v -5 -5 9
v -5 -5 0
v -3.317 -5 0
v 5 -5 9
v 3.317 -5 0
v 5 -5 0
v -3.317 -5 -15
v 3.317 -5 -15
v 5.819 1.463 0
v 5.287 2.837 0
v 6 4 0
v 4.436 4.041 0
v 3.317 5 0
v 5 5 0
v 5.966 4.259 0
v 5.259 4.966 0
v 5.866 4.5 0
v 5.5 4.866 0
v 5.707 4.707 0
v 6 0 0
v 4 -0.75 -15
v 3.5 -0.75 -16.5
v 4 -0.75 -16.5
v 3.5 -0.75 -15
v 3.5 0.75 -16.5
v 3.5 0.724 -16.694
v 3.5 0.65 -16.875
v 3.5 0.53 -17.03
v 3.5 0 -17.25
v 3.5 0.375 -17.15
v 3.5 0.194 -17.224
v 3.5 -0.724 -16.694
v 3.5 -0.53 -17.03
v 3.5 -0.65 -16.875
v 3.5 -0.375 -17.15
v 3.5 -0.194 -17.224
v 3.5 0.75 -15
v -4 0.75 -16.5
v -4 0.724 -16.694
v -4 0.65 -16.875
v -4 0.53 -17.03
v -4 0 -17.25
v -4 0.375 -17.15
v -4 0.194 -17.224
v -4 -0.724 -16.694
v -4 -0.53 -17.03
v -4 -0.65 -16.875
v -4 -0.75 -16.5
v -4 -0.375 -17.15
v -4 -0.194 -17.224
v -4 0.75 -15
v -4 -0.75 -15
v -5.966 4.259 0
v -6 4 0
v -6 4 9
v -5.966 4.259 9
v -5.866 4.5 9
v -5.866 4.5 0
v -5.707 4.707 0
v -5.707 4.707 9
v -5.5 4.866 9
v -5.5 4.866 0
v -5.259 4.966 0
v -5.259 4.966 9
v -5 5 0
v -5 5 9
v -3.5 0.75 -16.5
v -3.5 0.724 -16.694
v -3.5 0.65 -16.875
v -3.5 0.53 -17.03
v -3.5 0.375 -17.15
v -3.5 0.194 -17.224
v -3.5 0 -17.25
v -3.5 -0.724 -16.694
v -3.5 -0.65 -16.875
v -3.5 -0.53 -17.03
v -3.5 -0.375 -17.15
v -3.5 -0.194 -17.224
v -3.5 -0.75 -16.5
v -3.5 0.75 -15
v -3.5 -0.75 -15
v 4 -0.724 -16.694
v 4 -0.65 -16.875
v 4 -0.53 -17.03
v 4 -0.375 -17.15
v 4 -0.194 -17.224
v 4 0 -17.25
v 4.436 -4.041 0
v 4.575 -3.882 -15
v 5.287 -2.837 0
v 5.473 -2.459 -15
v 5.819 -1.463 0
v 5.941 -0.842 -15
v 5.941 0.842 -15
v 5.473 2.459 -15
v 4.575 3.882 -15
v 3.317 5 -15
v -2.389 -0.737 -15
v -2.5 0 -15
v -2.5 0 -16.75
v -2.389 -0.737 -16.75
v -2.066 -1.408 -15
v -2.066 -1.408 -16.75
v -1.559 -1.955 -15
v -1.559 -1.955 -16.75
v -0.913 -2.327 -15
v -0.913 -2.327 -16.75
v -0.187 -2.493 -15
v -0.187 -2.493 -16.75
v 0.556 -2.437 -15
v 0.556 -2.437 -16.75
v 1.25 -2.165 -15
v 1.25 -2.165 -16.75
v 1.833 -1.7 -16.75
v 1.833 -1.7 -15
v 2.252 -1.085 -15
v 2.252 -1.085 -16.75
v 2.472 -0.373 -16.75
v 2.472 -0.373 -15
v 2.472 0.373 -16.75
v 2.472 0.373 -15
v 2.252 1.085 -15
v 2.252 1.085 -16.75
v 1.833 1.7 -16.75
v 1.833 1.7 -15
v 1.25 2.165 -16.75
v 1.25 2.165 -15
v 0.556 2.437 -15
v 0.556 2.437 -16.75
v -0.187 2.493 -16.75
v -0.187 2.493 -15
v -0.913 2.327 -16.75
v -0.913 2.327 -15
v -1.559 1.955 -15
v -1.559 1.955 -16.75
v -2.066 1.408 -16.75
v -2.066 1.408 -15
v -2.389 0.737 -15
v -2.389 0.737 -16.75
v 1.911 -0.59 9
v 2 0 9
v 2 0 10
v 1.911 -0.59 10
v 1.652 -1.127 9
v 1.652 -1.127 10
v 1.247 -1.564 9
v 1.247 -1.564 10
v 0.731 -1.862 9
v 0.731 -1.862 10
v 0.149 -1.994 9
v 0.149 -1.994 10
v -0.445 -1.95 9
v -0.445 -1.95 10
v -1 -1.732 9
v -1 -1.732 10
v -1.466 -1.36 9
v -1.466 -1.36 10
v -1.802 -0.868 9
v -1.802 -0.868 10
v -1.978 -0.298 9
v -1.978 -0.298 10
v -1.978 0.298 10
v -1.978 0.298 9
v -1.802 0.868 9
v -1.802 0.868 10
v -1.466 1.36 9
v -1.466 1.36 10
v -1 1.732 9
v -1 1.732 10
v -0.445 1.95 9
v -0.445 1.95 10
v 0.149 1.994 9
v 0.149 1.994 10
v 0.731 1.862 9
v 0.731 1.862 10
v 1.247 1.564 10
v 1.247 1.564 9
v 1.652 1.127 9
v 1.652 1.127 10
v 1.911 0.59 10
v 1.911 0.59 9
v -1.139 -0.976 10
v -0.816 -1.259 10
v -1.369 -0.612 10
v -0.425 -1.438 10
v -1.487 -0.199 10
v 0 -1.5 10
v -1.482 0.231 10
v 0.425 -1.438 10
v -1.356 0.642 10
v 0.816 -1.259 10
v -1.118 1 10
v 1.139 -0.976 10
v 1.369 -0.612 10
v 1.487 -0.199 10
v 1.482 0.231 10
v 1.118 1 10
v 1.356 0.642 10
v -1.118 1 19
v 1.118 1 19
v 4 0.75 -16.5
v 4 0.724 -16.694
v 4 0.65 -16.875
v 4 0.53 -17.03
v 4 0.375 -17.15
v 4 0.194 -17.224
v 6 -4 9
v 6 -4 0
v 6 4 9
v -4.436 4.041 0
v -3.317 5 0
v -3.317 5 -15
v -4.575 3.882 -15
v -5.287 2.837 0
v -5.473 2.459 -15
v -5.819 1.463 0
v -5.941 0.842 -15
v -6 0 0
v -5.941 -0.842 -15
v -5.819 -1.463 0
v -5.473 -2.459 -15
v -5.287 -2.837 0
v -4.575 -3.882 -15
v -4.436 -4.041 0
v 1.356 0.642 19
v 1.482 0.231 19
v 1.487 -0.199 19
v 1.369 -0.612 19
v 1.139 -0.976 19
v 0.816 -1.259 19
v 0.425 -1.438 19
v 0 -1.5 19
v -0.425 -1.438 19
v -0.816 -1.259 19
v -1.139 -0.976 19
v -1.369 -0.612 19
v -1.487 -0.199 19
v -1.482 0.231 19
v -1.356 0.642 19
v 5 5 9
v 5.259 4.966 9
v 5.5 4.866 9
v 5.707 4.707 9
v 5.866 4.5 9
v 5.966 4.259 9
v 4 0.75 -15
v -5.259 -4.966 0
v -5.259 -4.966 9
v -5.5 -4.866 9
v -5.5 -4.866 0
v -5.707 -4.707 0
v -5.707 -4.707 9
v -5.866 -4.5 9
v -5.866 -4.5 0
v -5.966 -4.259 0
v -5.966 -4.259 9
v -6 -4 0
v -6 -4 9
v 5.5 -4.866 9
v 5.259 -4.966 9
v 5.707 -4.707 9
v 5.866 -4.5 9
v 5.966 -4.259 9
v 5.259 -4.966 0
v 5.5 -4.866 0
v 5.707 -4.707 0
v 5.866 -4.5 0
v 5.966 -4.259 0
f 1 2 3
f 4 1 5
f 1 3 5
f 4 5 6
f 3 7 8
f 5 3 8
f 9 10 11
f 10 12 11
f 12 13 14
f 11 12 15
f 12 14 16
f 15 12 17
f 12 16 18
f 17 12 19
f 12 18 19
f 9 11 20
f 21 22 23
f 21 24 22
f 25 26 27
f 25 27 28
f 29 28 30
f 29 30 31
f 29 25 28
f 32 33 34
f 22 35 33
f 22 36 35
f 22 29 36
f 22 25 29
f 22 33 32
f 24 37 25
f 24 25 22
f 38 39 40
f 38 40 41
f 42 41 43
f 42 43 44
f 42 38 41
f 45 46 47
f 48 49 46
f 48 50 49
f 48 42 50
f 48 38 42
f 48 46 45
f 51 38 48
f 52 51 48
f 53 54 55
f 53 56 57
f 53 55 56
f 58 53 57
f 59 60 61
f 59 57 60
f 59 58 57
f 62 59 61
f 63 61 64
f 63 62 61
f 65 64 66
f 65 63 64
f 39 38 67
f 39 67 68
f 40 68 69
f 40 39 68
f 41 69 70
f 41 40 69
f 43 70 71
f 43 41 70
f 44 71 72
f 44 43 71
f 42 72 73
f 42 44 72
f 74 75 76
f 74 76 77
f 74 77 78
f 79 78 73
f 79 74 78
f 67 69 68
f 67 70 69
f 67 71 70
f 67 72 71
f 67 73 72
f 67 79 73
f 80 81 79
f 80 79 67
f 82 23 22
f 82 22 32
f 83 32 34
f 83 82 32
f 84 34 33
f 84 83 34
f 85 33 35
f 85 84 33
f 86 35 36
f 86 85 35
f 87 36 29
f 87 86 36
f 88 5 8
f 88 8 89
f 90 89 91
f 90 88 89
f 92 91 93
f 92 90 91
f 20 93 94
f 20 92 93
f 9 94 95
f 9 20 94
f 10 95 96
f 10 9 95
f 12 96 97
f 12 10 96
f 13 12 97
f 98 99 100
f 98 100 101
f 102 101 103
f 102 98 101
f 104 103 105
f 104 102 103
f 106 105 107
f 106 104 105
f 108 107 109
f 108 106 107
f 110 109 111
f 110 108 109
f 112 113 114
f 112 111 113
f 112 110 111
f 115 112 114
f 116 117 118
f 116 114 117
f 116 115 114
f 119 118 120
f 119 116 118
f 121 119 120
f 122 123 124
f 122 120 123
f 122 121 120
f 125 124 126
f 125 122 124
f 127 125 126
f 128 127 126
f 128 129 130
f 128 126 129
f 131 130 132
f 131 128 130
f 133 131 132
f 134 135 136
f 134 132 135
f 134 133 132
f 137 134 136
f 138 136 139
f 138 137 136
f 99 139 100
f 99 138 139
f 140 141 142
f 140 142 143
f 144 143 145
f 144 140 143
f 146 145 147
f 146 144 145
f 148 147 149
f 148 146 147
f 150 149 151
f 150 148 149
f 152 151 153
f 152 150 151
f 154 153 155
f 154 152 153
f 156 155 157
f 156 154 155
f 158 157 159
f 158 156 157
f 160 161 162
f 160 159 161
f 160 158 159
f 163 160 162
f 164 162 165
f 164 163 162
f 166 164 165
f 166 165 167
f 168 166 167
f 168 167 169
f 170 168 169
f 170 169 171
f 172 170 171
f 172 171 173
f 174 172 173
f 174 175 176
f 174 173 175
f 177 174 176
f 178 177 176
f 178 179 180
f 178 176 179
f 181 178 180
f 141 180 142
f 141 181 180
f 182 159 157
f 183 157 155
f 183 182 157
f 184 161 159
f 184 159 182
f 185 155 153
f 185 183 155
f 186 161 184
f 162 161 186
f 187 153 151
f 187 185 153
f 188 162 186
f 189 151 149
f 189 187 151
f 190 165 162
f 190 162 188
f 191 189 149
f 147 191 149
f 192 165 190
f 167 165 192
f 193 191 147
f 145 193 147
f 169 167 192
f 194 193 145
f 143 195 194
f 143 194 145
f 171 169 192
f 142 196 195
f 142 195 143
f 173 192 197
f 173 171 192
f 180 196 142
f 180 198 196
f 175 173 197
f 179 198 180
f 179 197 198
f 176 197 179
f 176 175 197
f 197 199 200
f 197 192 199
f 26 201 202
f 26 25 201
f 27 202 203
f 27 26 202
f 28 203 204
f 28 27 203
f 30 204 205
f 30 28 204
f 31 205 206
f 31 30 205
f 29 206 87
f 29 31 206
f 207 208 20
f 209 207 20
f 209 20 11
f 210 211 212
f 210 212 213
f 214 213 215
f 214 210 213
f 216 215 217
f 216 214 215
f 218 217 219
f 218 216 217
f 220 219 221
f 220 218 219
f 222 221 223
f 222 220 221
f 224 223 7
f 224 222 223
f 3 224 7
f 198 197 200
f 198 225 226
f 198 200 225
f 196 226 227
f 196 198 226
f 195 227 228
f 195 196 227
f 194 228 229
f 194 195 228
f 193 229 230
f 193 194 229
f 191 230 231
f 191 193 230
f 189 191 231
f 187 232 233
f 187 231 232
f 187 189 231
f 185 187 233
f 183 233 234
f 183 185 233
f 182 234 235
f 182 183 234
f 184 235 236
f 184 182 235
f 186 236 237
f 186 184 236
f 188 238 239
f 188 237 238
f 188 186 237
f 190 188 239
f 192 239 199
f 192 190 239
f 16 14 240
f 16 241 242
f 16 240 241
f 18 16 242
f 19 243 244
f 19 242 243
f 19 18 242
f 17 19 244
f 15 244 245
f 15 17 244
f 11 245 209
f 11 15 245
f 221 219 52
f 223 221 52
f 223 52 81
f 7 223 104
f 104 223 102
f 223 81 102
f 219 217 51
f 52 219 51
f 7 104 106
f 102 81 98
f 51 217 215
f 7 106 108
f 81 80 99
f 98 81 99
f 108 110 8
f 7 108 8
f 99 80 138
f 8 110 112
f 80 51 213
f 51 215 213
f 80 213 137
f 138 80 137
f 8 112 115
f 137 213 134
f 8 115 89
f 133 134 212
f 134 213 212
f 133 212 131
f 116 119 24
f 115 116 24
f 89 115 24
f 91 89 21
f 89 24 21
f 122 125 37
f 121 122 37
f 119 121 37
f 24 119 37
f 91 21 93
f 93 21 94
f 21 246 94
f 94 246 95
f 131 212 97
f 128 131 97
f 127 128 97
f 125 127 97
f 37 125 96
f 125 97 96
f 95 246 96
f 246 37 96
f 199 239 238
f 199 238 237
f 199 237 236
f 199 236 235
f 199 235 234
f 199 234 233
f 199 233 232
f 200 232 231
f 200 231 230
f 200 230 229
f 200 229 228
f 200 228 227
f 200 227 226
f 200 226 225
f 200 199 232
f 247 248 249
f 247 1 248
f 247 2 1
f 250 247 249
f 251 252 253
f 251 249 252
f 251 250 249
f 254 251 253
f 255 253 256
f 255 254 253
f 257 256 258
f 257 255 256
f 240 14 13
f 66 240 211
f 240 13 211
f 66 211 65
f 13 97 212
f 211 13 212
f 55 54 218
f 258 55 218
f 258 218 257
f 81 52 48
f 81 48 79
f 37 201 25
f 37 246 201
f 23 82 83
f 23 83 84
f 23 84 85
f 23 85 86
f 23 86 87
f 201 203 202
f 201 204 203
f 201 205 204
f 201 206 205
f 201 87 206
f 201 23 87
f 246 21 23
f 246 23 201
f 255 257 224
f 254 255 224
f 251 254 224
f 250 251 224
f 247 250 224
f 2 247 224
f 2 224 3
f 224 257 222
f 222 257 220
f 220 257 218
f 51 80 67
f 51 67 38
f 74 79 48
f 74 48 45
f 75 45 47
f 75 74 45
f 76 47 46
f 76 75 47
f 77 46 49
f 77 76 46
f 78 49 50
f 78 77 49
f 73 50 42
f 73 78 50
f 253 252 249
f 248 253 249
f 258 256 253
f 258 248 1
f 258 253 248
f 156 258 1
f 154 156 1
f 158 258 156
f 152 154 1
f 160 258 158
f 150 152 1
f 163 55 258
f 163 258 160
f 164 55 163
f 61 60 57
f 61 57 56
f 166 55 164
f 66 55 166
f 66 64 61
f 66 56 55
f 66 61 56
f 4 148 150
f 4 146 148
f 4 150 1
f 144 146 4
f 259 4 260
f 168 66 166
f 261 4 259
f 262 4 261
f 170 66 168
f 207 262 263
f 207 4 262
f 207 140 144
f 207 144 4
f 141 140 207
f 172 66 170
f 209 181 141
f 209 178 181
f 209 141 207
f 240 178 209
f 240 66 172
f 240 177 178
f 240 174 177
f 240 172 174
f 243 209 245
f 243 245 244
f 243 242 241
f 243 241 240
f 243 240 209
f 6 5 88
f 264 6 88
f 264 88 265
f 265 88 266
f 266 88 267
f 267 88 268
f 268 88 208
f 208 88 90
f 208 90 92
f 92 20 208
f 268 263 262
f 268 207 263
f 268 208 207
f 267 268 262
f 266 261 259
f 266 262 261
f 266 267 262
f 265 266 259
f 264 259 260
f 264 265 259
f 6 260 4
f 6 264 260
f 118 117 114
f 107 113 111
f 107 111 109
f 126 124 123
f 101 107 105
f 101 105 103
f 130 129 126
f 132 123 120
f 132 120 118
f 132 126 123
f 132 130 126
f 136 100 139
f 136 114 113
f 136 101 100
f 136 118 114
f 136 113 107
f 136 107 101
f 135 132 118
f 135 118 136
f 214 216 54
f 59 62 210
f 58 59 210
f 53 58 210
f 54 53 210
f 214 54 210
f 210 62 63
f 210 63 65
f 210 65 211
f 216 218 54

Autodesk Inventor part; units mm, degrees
ref_plane "YZ Plane" through (0, 0, 0) normal (1, 0, 0) x (0, 1, 0)
ref_plane "XZ Plane" through (0, 0, 0) normal (0, 1, 0) x (-1, 0, 0)
ref_plane "XY Plane" through (0, 0, 0) normal (0, 0, 1) x (1, 0, 0)
sketch "Эскиз2" plane through (0, 0, 0) normal (0, 0, 1) x (1, 0, 0)
  line L0 (-5, -5) -> (5, -5)
  line L1 (6, -4) -> (6, 4)
  line L2 (5, 5) -> (-5, 5)
  line L3 (-6, 4) -> (-6, -4)
  line L4 (-6, -5) -> (6, 5) construction
  line L5 (6, -5) -> (-6, 5) construction
  arc A0 (-5, 5) -> (-6, 4) centre (-5, 4) ccw
  arc A1 (6, 4) -> (5, 5) centre (5, 4) ccw
  arc A2 (5, -5) -> (6, -4) centre (5, -4) ccw
  arc A3 (-6, -4) -> (-5, -5) centre (-5, -4) ccw
  arc A4 (-3.3166, 5) -> (-3.3166, -5) centre (0, 0) ccw
  arc A5 (3.3166, -5) -> (3.3166, 5) centre (0, 0) ccw
  dimension "d0" = 12
  dimension "d1" = 10
  dimension "d2" = 1
extrude "Выдавливание1" add sketch "Эскиз2" against normal blind 15 contours A4 L2 A5 L0
extrude "Выдавливание2" add sketch "Эскиз2" along normal blind 9
sketch "Эскиз3" plane through (0, 0, 9) normal (0, 0, 1) x (1, 0, 0)
  arc A0 (-1.118, 1) -> (1.118, 1) centre (0, 0) ccw
  circle A1 centre (0, 0) radius 2
  line L0 (-1.118, 1) -> (1.118, 1)
  arc A2 (1.118, 1) -> (-1.118, 1) centre (0, 0) ccw construction
  dimension "d8" = 3
  dimension "d9" = 4
  dimension "d10" = 2.5
extrude "Выдавливание3" add sketch "Эскиз3" along normal blind 1 contours L0 A0 | A1
extrude "Выдавливание4" add sketch "Эскиз3" along normal blind 10 contours L0 A0
sketch "Эскиз4" plane through (0, 0, -15) normal (0, 0, -1) x (-1, 0, 0)
  circle A0 centre (0, 0) radius 2.5
  line L0 (-4, 0.75) -> (-3.5, 0.75)
  line L1 (-3.5, 0.75) -> (-3.5, -0.75)
  line L2 (-3.5, -0.75) -> (-4, -0.75)
  line L3 (-4, -0.75) -> (-4, 0.75)
  line L4 (3.5, 0.75) -> (4, 0.75)
  line L5 (4, 0.75) -> (4, -0.75)
  line L6 (4, -0.75) -> (3.5, -0.75)
  line L7 (3.5, -0.75) -> (3.5, 0.75)
  line L8 (-3.5, 0) -> (3.5, 0) construction
  dimension "d15" = 5
  dimension "d18" = 8
  dimension "d19" = 7
  dimension "d20" = 1.5
extrude "Выдавливание5" add sketch "Эскиз4" along normal blind 1.75 contours A0
extrude "Выдавливание6" add sketch "Эскиз4" along normal blind 2.25 contours L0 L1 L2 L3 | L4 L5 L6 L7
fillet "Сопряжение1" radius 0.75 4 edges at (3.75, 0.75, -17.25) (3.75, -0.75, -17.25) (-3.75, 0.75, -17.25) (-3.75, -0.75, -17.25)
properties part number "Мотор 15x12x10 с редуктоом"
